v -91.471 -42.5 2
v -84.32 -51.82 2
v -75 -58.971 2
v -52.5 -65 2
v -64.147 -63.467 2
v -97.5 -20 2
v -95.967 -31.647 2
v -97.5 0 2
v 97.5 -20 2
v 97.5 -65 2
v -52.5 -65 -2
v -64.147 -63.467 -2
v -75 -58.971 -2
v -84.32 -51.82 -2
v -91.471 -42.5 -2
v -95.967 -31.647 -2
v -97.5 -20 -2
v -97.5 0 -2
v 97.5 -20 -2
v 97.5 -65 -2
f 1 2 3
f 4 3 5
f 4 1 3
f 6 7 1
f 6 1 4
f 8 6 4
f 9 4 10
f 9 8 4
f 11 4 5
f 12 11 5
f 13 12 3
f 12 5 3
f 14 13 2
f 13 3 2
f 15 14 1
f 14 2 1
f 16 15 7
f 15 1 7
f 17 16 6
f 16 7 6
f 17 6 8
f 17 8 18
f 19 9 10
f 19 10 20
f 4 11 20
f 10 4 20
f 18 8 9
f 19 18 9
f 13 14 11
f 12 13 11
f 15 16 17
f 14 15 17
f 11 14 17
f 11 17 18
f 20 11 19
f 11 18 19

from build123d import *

# Parameters (mm, degrees)
SKETCH1_W           = 195
SKETCH1_H           = 4
BOSS_EXTRUDE1_DEPTH = 65
CUT_EXTRUDE1_DEPTH  = 10
CUT_EXTRUDE2_DEPTH  = 10


with BuildPart() as part:
    # Sketch1 → Boss-Extrude1 (new body)
    with BuildSketch(Plane(origin=(0, 0, 0), x_dir=(1, 0, 0), z_dir=(0, 1, 0))):
        Rectangle(SKETCH1_W, SKETCH1_H)
    extrude(amount=-BOSS_EXTRUDE1_DEPTH)

    # Sketch2 → Cut-Extrude1 (cut)
    with BuildSketch(Plane.XY.offset(2)):
        Polygon((-97.5, 0), (97.5, -20), (97.5, 0), align=None)
    extrude(amount=-CUT_EXTRUDE1_DEPTH, mode=Mode.SUBTRACT)

    # Sketch3 → Cut-Extrude2 (cut)
    with BuildSketch(Plane.XY.offset(2)):
        with BuildLine():
            Line((-97.5, -20), (-97.5, -65))
            Line((-97.5, -65), (-52.5, -65))
            ThreePointArc((-52.5, -65), (-84.319805153, -51.819805153), (-97.5, -20))
        make_face()
    extrude(amount=-CUT_EXTRUDE2_DEPTH, mode=Mode.SUBTRACT)


solid = part.part
